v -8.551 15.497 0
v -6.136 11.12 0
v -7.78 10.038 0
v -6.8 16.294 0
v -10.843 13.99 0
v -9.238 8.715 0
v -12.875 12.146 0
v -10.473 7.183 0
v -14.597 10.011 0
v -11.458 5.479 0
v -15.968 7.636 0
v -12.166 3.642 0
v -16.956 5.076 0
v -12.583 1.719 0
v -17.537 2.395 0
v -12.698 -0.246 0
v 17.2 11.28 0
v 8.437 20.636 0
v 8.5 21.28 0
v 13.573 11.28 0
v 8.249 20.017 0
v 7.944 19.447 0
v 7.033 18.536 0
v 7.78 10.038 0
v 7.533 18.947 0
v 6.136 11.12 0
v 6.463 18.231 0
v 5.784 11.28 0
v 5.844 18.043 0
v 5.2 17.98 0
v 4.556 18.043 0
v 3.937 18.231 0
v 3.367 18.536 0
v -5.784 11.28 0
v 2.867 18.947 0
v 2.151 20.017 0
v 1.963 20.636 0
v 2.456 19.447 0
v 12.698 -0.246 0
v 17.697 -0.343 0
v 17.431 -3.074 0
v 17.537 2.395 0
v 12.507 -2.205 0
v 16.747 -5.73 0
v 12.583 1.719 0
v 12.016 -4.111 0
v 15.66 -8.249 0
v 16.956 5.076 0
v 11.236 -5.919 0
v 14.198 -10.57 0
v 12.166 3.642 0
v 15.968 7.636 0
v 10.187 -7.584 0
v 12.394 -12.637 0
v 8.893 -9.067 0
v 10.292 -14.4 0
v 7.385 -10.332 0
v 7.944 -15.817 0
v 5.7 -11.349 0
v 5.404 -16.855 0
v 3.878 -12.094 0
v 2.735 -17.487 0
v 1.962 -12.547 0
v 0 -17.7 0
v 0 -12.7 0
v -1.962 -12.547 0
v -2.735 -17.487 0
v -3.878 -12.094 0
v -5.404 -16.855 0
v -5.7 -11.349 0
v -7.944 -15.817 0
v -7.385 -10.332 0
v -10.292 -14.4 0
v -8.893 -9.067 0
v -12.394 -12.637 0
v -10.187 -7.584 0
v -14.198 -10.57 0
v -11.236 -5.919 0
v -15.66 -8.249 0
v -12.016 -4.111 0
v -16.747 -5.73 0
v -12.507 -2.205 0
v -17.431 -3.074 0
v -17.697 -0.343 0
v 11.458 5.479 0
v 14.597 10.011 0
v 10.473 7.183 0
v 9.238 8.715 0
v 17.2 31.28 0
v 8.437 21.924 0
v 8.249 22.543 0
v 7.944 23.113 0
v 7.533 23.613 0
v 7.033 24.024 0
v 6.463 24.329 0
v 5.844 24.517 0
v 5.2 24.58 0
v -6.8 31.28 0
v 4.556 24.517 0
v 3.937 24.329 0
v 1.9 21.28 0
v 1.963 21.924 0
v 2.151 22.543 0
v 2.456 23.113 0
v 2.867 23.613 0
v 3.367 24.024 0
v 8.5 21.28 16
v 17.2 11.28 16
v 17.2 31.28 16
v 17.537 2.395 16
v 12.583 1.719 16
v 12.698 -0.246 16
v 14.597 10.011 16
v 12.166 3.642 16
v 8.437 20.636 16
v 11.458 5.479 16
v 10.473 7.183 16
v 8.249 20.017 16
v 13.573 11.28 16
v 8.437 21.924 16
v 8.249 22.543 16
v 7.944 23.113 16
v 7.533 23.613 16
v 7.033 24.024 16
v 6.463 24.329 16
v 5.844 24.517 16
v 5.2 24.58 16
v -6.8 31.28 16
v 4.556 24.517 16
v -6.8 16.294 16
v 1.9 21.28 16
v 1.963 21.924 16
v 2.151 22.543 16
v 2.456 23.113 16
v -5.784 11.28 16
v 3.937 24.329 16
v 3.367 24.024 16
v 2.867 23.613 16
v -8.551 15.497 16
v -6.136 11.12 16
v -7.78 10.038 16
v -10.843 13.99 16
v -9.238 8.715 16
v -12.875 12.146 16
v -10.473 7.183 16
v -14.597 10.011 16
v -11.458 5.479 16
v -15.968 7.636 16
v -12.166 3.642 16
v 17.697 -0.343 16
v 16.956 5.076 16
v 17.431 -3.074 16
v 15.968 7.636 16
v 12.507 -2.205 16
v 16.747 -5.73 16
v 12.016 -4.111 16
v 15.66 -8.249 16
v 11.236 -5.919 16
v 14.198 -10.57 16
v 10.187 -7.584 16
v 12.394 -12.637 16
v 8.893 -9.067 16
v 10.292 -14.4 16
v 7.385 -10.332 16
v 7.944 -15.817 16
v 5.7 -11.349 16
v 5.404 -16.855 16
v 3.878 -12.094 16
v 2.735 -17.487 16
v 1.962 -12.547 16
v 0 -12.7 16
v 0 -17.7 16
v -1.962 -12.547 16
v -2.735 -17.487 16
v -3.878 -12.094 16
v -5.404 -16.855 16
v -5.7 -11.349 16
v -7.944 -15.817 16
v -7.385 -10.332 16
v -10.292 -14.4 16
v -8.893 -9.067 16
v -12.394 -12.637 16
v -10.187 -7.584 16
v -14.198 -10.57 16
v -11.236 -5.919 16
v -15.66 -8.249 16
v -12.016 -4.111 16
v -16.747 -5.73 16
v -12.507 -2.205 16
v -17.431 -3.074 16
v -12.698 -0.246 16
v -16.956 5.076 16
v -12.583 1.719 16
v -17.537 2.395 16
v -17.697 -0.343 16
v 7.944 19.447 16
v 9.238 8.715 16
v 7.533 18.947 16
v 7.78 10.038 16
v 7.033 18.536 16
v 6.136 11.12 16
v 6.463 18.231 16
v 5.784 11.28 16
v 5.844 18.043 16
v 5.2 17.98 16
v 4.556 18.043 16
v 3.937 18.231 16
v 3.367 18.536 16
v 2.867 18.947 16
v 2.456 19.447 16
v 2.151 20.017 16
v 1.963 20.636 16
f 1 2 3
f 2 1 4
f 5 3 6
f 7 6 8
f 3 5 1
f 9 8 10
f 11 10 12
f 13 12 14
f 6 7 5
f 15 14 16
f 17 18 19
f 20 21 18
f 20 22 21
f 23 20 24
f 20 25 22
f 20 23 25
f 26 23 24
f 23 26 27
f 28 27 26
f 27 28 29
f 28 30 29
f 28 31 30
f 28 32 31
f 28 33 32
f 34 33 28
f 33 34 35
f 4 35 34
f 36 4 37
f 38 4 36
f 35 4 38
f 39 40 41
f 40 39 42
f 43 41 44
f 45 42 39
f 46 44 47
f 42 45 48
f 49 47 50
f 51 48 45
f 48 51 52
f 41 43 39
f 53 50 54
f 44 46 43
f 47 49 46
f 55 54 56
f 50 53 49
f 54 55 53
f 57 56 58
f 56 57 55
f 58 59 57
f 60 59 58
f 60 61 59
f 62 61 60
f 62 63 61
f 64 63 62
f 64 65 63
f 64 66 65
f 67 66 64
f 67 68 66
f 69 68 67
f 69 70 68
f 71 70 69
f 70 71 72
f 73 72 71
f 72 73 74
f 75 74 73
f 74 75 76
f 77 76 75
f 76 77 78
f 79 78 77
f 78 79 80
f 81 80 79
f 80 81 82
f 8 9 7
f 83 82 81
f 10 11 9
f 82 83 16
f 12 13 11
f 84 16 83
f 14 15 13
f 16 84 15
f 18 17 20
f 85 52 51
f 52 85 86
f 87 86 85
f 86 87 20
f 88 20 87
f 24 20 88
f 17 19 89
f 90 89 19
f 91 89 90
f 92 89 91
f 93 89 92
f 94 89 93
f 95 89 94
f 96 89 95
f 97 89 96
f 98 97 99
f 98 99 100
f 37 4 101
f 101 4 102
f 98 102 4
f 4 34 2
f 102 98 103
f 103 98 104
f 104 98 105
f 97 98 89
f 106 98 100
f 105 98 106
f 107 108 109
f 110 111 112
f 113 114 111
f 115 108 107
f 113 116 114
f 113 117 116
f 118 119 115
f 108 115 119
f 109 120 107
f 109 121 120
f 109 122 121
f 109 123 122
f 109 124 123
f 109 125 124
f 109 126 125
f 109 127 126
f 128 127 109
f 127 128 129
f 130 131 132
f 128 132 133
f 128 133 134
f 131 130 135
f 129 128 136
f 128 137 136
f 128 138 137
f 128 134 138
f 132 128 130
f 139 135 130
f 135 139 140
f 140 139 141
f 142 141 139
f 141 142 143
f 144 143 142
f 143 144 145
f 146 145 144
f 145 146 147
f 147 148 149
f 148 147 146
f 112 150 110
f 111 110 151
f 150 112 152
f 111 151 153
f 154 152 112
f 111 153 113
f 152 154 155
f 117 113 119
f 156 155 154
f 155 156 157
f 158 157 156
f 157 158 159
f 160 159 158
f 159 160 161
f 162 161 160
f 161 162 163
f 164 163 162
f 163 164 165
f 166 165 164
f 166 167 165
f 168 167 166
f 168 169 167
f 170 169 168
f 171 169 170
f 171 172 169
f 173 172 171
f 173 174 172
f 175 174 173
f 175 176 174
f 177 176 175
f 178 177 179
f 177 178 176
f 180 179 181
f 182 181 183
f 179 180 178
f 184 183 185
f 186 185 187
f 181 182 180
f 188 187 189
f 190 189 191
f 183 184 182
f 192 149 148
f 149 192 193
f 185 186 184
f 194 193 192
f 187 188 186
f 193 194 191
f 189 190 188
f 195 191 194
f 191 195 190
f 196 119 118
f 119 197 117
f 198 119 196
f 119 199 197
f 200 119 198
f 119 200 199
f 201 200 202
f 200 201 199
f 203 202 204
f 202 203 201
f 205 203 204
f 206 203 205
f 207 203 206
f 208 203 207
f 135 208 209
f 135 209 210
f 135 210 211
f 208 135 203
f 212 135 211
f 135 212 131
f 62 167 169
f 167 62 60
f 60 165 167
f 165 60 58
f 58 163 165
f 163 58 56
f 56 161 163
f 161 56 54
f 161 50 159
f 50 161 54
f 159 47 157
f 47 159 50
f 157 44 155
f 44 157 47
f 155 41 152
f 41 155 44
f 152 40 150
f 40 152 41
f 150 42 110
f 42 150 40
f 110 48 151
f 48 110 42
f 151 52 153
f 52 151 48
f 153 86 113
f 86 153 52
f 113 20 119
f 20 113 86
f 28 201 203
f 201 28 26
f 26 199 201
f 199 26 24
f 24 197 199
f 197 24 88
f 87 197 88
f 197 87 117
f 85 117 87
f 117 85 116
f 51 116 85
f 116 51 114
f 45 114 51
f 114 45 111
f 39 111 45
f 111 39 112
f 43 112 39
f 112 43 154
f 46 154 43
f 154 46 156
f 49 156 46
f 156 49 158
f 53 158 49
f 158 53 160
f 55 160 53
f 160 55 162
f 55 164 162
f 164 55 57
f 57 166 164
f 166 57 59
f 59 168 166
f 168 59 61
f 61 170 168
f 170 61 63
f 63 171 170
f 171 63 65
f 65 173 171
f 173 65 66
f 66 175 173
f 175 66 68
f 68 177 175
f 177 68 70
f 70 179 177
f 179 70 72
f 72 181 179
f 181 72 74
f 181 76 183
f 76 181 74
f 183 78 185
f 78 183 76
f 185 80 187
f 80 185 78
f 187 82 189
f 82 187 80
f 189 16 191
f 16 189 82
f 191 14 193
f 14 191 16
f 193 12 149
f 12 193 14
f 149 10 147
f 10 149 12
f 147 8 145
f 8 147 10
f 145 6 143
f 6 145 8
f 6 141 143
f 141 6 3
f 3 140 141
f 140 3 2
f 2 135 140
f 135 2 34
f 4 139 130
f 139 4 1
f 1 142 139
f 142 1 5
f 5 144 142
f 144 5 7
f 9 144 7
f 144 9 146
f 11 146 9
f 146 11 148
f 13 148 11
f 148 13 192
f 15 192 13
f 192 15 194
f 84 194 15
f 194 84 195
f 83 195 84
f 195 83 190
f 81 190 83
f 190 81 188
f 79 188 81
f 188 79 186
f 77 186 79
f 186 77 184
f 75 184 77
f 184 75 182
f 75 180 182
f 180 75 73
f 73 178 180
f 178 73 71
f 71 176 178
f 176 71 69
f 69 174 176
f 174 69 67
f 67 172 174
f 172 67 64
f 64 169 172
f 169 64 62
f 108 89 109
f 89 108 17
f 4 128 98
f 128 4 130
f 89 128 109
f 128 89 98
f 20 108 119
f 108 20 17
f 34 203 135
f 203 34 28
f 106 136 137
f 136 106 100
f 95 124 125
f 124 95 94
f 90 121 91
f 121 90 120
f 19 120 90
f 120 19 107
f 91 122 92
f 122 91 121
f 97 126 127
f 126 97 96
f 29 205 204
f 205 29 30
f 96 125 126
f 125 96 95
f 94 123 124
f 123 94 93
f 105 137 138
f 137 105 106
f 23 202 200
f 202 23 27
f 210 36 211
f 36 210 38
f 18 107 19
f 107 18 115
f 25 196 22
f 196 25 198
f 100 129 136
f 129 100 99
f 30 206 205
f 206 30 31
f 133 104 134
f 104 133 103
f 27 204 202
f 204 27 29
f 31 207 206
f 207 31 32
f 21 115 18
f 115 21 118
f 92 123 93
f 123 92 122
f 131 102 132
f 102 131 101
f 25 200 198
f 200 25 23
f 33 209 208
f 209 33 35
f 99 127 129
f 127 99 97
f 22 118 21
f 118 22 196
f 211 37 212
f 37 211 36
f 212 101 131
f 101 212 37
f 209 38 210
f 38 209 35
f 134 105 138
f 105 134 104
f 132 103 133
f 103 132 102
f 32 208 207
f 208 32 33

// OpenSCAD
$fn = 32;

// ----------------------------------------------------------------------
// Pipe clamp: 35.4 mm ring, 5 mm wall, 16 mm wide
// ----------------------------------------------------------------------

// --- parameters (mm) ---
outer_r = 17.7;           // clamp outside radius
inner_r = 12.7;           // pipe bore radius
band = 5;                 // band thickness
clamp_w = 16;             // clamp width
opening = 40;             // opening angle between the ends
lug_w = 24;               // lug width
lug_len = 20;             // lug length
bolt_d = 6.6;             // bolt hole

clamp_profile = [[-6.054, 16.633], [-8.551, 15.497], [-10.843, 13.99], [-12.875, 12.146], [-14.597, 10.011], [-15.968, 7.636], [-16.956, 5.076], [-17.537, 2.395], [-17.697, -0.343], [-17.431, -3.074], [-16.747, -5.73], [-15.66, -8.249], [-14.198, -10.57], [-12.394, -12.637], [-10.292, -14.4], [-7.944, -15.817], [-5.404, -16.855], [-2.735, -17.487], [0, -17.7], [2.735, -17.487], [5.404, -16.855], [7.944, -15.817], [10.292, -14.4], [12.394, -12.637], [14.198, -10.57], [15.66, -8.249], [16.747, -5.73], [17.431, -3.074], [17.697, -0.343], [17.537, 2.395], [16.956, 5.076], [15.968, 7.636], [14.597, 10.011], [12.875, 12.146], [10.843, 13.99], [8.551, 15.497], [6.054, 16.633], [4.344, 11.934], [6.136, 11.12], [7.78, 10.038], [9.238, 8.715], [10.473, 7.183], [11.458, 5.479], [12.166, 3.642], [12.583, 1.719], [12.698, -0.246], [12.507, -2.205], [12.016, -4.111], [11.236, -5.919], [10.187, -7.584], [8.893, -9.067], [7.385, -10.332], [5.7, -11.349], [3.878, -12.094], [1.962, -12.547], [0, -12.7], [-1.962, -12.547], [-3.878, -12.094], [-5.7, -11.349], [-7.385, -10.332], [-8.893, -9.067], [-10.187, -7.584], [-11.236, -5.919], [-12.016, -4.111], [-12.507, -2.205], [-12.698, -0.246], [-12.583, 1.719], [-12.166, 3.642], [-11.458, 5.479], [-10.473, 7.183], [-9.238, 8.715], [-7.78, 10.038], [-6.136, 11.12], [-4.344, 11.934]];

difference() {
  union() {
    linear_extrude(height = clamp_w) polygon(clamp_profile);
    /* bolt lug on the other end */
    translate([-6.8, 11.28, 0]) cube([lug_w, 20, clamp_w]);
  }
  translate([5.2, 21.28, -2.5]) cylinder(h = clamp_w + 5, d = bolt_d);
}
